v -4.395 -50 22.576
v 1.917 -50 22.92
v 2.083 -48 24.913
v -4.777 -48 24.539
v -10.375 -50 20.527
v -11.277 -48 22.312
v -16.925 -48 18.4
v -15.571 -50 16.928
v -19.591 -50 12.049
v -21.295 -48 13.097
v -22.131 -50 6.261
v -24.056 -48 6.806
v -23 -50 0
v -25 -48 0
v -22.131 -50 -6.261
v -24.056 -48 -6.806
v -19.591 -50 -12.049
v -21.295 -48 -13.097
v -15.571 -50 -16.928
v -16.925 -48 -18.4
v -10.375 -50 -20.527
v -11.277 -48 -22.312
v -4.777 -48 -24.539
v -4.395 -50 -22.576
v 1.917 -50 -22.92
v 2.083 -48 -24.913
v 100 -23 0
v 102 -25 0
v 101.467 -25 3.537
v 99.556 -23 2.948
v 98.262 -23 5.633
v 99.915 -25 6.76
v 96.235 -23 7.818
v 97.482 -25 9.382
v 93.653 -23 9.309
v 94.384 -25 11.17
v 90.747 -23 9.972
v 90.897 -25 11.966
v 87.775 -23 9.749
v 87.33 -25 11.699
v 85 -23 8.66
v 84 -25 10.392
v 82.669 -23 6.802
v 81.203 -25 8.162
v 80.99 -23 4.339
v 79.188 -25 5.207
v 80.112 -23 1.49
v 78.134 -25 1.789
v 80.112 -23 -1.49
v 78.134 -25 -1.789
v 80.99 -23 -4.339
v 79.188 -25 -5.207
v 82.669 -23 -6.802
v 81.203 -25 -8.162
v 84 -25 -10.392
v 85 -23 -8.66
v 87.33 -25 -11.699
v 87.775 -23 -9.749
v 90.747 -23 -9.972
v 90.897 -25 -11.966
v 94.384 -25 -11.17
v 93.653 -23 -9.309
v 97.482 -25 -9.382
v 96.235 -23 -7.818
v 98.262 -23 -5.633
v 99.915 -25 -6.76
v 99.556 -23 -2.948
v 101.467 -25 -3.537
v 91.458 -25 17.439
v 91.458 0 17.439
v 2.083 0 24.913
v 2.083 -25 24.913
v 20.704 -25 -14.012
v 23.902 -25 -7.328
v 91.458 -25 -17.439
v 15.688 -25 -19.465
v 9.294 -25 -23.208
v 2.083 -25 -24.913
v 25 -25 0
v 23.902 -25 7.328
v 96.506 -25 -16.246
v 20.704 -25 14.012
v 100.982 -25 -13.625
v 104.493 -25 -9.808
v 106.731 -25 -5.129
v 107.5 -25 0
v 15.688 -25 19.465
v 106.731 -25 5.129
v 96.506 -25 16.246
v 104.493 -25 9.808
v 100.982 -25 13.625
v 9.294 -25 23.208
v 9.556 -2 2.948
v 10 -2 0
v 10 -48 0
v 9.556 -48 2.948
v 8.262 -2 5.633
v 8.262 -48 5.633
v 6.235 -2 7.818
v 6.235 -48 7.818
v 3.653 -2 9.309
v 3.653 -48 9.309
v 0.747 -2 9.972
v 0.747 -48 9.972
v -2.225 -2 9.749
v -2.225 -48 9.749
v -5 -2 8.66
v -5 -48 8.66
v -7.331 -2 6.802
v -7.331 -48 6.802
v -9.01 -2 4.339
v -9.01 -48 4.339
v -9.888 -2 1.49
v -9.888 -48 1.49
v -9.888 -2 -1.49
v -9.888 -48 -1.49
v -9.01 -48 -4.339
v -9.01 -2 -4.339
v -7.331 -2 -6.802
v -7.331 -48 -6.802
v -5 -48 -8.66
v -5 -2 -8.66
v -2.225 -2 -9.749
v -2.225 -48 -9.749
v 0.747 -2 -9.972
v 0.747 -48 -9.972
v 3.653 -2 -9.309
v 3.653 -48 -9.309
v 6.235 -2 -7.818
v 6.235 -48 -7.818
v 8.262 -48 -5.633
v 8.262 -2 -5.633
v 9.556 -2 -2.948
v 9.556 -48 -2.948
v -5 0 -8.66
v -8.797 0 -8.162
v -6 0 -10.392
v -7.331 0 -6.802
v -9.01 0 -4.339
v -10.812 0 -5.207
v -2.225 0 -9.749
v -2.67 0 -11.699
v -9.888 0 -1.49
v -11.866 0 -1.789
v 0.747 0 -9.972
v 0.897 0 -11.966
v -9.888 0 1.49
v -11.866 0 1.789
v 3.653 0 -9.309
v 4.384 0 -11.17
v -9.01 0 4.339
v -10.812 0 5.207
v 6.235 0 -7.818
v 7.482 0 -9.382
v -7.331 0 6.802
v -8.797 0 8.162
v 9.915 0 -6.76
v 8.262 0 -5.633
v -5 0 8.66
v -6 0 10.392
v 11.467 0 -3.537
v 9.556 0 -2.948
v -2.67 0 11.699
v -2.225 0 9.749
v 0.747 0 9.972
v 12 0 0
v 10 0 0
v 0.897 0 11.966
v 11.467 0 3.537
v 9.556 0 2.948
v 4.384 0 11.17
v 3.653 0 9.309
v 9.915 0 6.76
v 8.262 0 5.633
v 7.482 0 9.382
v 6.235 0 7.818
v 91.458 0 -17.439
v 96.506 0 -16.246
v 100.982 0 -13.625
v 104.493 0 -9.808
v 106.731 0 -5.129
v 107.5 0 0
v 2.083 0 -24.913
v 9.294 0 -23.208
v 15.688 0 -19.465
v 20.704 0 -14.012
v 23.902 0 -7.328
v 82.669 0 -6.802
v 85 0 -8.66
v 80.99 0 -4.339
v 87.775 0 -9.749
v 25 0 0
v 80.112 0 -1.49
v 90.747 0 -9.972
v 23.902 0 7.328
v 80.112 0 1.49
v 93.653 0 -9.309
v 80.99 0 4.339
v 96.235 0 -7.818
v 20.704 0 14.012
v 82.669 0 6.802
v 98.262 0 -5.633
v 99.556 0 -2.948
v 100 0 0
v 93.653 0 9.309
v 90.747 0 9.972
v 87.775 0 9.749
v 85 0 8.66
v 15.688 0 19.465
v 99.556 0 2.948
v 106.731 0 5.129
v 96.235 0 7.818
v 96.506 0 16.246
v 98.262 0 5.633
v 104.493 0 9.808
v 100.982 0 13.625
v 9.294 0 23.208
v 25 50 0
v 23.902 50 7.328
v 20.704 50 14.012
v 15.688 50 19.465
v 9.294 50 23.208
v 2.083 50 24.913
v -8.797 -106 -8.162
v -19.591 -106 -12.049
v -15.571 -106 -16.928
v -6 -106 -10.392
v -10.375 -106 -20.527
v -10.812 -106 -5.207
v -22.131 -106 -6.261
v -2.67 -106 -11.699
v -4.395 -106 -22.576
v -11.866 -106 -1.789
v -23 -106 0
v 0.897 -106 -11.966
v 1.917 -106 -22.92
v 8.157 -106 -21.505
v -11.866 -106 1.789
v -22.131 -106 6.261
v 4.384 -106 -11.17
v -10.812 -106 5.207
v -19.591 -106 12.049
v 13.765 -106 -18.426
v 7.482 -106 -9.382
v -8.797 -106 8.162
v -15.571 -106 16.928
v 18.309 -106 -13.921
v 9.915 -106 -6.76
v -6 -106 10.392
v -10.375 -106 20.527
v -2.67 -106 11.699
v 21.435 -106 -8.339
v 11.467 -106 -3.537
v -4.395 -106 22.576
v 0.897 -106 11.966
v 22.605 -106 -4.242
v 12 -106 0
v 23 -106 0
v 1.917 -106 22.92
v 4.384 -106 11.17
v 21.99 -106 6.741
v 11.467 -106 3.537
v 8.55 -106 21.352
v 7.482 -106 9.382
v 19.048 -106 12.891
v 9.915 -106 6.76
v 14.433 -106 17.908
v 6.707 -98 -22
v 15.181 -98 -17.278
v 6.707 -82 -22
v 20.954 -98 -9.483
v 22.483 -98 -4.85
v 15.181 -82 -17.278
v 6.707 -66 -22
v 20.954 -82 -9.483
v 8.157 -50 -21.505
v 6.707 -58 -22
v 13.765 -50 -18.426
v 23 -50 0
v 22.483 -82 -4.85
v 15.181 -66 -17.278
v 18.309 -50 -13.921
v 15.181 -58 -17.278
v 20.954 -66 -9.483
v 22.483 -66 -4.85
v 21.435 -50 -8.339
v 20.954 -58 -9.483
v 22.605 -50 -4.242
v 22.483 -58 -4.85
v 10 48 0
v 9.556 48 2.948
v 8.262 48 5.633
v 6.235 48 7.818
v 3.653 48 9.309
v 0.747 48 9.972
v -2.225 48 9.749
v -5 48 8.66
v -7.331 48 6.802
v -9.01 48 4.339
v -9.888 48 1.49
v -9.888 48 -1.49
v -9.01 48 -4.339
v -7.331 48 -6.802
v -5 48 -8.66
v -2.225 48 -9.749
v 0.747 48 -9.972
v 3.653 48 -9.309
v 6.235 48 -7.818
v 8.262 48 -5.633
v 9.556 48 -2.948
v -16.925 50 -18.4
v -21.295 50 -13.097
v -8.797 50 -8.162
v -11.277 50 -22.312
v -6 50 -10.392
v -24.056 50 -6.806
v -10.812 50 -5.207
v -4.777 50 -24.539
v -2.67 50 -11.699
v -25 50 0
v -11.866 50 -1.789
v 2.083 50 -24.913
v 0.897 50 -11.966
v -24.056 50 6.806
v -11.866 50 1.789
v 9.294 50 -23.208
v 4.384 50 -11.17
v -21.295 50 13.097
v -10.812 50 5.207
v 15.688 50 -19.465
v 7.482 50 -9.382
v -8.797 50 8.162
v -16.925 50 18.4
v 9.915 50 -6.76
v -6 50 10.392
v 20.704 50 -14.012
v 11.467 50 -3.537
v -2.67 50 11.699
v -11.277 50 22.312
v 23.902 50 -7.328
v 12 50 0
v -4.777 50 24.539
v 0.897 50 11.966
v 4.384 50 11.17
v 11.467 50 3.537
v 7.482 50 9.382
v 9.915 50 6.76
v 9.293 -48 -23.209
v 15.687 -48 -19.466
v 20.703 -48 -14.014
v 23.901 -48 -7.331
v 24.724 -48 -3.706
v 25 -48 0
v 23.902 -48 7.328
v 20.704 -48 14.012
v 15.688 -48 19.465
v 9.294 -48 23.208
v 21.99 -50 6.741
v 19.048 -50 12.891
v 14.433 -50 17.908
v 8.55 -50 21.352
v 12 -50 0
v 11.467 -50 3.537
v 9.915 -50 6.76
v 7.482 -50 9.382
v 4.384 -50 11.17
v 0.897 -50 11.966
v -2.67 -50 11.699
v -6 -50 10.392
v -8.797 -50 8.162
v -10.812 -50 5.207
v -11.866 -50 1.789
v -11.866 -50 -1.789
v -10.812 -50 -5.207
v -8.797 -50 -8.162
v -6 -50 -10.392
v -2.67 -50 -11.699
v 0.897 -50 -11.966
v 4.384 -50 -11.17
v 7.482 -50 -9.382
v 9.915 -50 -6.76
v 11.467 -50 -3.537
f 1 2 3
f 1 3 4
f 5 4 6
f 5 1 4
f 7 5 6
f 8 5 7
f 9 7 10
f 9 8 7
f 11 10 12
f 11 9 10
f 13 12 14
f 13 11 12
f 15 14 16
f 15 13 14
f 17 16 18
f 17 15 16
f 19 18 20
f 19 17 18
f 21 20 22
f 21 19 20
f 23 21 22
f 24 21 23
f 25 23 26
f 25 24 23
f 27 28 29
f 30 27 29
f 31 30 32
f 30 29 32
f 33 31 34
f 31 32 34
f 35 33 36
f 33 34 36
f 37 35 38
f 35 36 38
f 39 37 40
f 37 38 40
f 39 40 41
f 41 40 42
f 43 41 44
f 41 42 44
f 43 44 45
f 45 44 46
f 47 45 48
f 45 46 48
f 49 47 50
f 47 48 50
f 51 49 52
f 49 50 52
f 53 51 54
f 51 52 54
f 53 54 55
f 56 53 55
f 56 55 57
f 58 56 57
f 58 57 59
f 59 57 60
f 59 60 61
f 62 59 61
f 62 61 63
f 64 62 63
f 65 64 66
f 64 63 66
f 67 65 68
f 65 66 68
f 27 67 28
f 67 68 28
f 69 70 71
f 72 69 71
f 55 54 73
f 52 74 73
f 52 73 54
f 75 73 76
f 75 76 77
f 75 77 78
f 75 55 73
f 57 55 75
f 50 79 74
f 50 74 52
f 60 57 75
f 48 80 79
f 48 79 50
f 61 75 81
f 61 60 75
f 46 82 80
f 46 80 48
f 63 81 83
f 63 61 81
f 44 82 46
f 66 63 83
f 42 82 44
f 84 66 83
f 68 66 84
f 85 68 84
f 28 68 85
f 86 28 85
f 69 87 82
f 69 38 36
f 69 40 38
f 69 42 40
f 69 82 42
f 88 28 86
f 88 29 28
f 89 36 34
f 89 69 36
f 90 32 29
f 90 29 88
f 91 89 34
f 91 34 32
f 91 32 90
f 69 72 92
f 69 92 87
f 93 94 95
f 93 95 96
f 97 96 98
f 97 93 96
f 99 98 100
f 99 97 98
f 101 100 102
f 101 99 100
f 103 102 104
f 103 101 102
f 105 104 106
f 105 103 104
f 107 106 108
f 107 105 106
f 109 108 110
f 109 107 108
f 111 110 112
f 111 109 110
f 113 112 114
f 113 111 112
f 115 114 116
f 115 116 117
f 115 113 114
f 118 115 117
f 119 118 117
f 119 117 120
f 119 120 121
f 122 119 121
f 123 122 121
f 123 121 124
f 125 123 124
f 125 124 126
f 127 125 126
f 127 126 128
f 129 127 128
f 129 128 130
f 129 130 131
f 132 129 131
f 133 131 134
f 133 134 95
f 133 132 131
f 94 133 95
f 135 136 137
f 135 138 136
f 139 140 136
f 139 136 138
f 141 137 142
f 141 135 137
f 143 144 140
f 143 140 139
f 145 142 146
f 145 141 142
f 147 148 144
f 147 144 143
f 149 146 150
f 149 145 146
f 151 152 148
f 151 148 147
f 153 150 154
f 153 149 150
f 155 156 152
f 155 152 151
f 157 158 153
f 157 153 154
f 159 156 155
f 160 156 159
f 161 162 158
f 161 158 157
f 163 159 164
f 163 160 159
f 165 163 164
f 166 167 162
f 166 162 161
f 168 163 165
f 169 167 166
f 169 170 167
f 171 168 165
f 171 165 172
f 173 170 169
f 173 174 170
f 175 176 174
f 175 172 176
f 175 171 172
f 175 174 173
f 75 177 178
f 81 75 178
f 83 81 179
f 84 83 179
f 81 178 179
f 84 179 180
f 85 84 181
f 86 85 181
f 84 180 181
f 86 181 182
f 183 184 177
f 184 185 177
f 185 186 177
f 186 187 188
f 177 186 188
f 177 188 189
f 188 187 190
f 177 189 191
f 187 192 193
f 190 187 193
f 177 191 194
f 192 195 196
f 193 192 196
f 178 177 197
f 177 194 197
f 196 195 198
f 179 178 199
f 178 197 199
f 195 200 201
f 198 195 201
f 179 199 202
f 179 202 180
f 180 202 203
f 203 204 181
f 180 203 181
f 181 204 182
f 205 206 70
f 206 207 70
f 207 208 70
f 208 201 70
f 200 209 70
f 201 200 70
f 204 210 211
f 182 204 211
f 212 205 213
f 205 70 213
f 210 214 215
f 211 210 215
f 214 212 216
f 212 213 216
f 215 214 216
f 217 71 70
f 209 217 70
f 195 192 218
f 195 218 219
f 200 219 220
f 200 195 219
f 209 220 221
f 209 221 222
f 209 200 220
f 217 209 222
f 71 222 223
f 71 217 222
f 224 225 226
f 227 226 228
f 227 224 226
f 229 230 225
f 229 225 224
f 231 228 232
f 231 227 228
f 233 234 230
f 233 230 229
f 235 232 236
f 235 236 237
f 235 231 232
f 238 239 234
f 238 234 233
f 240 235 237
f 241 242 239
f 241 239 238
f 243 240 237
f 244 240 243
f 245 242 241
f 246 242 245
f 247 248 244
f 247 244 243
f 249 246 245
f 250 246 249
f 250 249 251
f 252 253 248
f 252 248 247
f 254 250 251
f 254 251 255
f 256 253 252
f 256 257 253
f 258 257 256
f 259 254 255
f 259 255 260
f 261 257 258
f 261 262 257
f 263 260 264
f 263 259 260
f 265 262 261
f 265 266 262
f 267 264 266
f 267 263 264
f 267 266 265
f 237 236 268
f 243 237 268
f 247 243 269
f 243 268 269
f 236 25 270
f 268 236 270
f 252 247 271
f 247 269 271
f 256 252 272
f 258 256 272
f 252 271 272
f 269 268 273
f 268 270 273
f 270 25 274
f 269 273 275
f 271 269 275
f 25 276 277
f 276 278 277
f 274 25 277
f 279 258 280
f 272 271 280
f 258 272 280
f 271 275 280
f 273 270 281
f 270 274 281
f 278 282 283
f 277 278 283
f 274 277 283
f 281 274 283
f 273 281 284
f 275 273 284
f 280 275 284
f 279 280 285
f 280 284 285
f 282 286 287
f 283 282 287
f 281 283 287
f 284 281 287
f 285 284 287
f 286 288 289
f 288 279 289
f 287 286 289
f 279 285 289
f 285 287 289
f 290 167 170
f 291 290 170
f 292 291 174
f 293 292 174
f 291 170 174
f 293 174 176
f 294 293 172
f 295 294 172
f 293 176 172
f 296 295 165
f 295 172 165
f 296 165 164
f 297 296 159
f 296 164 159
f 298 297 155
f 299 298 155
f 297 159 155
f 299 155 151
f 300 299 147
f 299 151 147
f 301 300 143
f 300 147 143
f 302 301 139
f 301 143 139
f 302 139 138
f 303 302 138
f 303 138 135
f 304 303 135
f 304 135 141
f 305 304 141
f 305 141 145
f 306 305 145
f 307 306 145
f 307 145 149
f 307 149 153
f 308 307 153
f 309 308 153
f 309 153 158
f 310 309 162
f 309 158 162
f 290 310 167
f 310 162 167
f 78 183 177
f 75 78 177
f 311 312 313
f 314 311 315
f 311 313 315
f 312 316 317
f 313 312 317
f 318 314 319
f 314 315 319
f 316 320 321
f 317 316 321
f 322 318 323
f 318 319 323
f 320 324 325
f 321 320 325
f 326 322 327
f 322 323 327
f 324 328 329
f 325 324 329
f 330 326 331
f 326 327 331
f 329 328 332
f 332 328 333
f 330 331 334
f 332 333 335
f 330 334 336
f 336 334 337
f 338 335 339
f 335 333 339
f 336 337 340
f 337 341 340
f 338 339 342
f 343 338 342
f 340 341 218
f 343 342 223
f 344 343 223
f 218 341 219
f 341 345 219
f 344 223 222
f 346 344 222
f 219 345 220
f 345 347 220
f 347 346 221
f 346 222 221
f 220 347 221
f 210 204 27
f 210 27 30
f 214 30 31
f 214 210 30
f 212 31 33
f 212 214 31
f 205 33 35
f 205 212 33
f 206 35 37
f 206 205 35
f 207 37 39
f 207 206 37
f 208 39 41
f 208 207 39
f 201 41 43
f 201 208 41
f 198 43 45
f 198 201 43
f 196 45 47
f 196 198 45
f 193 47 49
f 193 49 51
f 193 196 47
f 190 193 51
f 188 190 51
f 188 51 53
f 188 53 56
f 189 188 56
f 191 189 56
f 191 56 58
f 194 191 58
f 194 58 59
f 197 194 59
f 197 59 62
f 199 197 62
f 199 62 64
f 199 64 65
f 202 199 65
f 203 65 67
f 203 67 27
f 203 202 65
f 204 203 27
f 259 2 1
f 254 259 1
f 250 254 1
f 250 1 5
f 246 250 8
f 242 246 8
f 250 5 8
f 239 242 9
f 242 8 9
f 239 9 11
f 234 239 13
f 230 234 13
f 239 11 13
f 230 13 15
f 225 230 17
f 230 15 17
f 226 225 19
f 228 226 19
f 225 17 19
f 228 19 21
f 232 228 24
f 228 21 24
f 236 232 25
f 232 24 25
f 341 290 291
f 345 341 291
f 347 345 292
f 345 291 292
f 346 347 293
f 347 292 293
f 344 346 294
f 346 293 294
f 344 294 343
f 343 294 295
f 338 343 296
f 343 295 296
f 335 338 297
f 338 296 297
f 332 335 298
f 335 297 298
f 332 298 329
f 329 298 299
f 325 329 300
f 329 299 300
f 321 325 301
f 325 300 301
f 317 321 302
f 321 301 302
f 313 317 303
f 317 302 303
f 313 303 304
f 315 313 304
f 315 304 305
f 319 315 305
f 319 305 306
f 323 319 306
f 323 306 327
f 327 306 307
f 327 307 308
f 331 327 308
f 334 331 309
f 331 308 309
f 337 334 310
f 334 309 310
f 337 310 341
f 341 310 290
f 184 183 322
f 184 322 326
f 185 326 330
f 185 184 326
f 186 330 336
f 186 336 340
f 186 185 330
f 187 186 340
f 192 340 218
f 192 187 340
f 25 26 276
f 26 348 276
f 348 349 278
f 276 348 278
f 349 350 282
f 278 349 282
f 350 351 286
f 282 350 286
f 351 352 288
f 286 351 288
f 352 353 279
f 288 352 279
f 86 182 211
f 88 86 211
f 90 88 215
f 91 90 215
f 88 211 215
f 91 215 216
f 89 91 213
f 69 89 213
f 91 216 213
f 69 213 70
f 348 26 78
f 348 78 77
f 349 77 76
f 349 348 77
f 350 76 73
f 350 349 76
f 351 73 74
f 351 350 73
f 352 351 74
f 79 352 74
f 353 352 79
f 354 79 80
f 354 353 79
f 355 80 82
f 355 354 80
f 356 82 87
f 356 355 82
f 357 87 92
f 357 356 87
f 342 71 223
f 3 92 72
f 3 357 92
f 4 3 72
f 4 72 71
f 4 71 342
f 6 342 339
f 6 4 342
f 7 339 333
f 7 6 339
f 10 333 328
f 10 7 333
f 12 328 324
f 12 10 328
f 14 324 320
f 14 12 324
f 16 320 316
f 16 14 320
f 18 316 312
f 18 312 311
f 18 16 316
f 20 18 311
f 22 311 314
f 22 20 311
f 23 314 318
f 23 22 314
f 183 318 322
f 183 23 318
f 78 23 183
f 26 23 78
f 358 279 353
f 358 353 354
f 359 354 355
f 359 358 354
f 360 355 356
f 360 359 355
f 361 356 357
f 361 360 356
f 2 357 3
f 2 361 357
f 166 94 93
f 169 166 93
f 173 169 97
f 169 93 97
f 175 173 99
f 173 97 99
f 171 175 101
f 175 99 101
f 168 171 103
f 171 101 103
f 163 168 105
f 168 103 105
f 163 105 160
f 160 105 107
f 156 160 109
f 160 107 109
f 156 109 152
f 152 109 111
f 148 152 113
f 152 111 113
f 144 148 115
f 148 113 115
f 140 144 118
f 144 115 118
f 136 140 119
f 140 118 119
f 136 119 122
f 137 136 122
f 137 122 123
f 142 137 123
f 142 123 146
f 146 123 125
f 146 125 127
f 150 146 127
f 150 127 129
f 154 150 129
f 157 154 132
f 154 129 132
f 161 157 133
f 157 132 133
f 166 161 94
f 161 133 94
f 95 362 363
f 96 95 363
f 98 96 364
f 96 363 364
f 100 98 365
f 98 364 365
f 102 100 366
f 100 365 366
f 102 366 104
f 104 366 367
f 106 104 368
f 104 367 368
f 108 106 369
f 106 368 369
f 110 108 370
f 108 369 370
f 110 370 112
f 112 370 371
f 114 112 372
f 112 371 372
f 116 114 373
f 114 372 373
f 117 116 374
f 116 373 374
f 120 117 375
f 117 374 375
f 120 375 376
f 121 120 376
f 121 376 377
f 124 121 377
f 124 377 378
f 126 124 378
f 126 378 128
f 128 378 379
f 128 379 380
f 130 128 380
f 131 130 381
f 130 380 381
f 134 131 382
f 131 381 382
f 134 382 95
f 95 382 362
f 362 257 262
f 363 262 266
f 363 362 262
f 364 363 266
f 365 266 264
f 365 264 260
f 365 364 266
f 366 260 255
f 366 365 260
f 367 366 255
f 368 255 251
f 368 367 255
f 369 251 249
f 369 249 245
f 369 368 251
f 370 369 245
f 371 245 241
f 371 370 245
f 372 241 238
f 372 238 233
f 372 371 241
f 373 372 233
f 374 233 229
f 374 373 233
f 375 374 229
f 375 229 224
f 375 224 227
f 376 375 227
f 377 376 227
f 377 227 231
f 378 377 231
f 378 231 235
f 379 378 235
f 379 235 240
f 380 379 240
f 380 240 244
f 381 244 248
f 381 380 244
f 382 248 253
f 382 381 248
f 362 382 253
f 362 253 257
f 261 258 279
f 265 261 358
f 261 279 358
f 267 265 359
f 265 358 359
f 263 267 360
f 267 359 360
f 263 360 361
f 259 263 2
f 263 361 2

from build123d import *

# Parameters (mm, degrees)
F0_R     = 10
F1_DEPTH = 25
F2_DEPTH = 50
F3_SIZE  = 2
F4_SIZE  = 2
F5_DEPTH = 50
F6_SIZE  = 2
F7_DEPTH = 56


with BuildPart() as f1:
    # F0 (on Front) → F1 (new body)
    with BuildSketch(Plane.XZ):
        with BuildLine():
            ThreePointArc((2.0833333333, -24.9130432148), (18.3995018048, -16.9250800097), (25, 0))
            ThreePointArc((25, 0), (18.3995018048, 16.9250800097), (2.0833333333, 24.9130432148))
            ThreePointArc((2.0833333333, 24.9130432148), (-25, 0), (2.0833333333, -24.9130432148))
        make_face()
        Circle(F0_R, mode=Mode.SUBTRACT)
        with BuildLine():
            ThreePointArc((2.0833333333, 24.9130432148), (18.3995018048, 16.9250800097), (25, 0))
            ThreePointArc((25, 0), (18.3995018048, -16.9250800097), (2.0833333333, -24.9130432148))
            Line((2.0833333333, -24.9130432148), (91.4583333333, -17.4391302504))
            ThreePointArc((91.4583333333, -17.4391302504), (72.5, 0), (91.4583333333, 17.4391302504))
            Line((91.4583333333, 17.4391302504), (2.0833333333, 24.9130432148))
        make_face()
        with BuildLine():
            ThreePointArc((107.5, 0), (102.8796512634, 11.8475560068), (91.4583333333, 17.4391302504))
            ThreePointArc((91.4583333333, 17.4391302504), (72.5, 0), (91.4583333333, -17.4391302504))
            ThreePointArc((91.4583333333, -17.4391302504), (102.8796512634, -11.8475560068), (107.5, 0))
        make_face()
        with Locations((90, 0)):
            Circle(F0_R, mode=Mode.SUBTRACT)
    extrude(amount=F1_DEPTH)

    # F0 (on Front) → F2 (join)
    with BuildSketch(Plane.XZ):
        with BuildLine():
            ThreePointArc((2.0833333333, -24.9130432148), (18.3995018048, -16.9250800097), (25, 0))
            ThreePointArc((25, 0), (18.3995018048, 16.9250800097), (2.0833333333, 24.9130432148))
            ThreePointArc((2.0833333333, 24.9130432148), (-25, 0), (2.0833333333, -24.9130432148))
        make_face()
        Circle(F0_R, mode=Mode.SUBTRACT)
    extrude(amount=F2_DEPTH)

    # F3
    f3_edges = [f1.edges().sort_by_distance(p)[0] for p in [
        (-2.083333, -50, 24.913043),
        (-10, -50, 0),
        (80, -25, 0),
    ]]
    chamfer(f3_edges, length=F3_SIZE)

    # F4
    f4_edges = [f1.edges().sort_by_distance(p)[0] for p in [
        (-10, 0, 0),
    ]]
    chamfer(f4_edges, length=F4_SIZE)

    # F0 (on Front) → F5 (join)
    with BuildSketch(Plane.XZ):
        with BuildLine():
            ThreePointArc((2.0833333333, -24.9130432148), (18.3995018048, -16.9250800097), (25, 0))
            ThreePointArc((25, 0), (18.3995018048, 16.9250800097), (2.0833333333, 24.9130432148))
            ThreePointArc((2.0833333333, 24.9130432148), (-25, 0), (2.0833333333, -24.9130432148))
        make_face()
        Circle(F0_R, mode=Mode.SUBTRACT)
    extrude(amount=-F5_DEPTH)

    # F6
    f6_edges = [f1.edges().sort_by_distance(p)[0] for p in [
        (-10, 50, 0),
    ]]
    chamfer(f6_edges, length=F6_SIZE)

    # F7 (add): a face of the model
    f7_faces = [f1.faces().sort_by_distance(p)[0] for p in [
        (-1.8624551468, -50, 22.2717242675),
    ]]
    extrude(f7_faces, amount=F7_DEPTH)


solid = f1.part
